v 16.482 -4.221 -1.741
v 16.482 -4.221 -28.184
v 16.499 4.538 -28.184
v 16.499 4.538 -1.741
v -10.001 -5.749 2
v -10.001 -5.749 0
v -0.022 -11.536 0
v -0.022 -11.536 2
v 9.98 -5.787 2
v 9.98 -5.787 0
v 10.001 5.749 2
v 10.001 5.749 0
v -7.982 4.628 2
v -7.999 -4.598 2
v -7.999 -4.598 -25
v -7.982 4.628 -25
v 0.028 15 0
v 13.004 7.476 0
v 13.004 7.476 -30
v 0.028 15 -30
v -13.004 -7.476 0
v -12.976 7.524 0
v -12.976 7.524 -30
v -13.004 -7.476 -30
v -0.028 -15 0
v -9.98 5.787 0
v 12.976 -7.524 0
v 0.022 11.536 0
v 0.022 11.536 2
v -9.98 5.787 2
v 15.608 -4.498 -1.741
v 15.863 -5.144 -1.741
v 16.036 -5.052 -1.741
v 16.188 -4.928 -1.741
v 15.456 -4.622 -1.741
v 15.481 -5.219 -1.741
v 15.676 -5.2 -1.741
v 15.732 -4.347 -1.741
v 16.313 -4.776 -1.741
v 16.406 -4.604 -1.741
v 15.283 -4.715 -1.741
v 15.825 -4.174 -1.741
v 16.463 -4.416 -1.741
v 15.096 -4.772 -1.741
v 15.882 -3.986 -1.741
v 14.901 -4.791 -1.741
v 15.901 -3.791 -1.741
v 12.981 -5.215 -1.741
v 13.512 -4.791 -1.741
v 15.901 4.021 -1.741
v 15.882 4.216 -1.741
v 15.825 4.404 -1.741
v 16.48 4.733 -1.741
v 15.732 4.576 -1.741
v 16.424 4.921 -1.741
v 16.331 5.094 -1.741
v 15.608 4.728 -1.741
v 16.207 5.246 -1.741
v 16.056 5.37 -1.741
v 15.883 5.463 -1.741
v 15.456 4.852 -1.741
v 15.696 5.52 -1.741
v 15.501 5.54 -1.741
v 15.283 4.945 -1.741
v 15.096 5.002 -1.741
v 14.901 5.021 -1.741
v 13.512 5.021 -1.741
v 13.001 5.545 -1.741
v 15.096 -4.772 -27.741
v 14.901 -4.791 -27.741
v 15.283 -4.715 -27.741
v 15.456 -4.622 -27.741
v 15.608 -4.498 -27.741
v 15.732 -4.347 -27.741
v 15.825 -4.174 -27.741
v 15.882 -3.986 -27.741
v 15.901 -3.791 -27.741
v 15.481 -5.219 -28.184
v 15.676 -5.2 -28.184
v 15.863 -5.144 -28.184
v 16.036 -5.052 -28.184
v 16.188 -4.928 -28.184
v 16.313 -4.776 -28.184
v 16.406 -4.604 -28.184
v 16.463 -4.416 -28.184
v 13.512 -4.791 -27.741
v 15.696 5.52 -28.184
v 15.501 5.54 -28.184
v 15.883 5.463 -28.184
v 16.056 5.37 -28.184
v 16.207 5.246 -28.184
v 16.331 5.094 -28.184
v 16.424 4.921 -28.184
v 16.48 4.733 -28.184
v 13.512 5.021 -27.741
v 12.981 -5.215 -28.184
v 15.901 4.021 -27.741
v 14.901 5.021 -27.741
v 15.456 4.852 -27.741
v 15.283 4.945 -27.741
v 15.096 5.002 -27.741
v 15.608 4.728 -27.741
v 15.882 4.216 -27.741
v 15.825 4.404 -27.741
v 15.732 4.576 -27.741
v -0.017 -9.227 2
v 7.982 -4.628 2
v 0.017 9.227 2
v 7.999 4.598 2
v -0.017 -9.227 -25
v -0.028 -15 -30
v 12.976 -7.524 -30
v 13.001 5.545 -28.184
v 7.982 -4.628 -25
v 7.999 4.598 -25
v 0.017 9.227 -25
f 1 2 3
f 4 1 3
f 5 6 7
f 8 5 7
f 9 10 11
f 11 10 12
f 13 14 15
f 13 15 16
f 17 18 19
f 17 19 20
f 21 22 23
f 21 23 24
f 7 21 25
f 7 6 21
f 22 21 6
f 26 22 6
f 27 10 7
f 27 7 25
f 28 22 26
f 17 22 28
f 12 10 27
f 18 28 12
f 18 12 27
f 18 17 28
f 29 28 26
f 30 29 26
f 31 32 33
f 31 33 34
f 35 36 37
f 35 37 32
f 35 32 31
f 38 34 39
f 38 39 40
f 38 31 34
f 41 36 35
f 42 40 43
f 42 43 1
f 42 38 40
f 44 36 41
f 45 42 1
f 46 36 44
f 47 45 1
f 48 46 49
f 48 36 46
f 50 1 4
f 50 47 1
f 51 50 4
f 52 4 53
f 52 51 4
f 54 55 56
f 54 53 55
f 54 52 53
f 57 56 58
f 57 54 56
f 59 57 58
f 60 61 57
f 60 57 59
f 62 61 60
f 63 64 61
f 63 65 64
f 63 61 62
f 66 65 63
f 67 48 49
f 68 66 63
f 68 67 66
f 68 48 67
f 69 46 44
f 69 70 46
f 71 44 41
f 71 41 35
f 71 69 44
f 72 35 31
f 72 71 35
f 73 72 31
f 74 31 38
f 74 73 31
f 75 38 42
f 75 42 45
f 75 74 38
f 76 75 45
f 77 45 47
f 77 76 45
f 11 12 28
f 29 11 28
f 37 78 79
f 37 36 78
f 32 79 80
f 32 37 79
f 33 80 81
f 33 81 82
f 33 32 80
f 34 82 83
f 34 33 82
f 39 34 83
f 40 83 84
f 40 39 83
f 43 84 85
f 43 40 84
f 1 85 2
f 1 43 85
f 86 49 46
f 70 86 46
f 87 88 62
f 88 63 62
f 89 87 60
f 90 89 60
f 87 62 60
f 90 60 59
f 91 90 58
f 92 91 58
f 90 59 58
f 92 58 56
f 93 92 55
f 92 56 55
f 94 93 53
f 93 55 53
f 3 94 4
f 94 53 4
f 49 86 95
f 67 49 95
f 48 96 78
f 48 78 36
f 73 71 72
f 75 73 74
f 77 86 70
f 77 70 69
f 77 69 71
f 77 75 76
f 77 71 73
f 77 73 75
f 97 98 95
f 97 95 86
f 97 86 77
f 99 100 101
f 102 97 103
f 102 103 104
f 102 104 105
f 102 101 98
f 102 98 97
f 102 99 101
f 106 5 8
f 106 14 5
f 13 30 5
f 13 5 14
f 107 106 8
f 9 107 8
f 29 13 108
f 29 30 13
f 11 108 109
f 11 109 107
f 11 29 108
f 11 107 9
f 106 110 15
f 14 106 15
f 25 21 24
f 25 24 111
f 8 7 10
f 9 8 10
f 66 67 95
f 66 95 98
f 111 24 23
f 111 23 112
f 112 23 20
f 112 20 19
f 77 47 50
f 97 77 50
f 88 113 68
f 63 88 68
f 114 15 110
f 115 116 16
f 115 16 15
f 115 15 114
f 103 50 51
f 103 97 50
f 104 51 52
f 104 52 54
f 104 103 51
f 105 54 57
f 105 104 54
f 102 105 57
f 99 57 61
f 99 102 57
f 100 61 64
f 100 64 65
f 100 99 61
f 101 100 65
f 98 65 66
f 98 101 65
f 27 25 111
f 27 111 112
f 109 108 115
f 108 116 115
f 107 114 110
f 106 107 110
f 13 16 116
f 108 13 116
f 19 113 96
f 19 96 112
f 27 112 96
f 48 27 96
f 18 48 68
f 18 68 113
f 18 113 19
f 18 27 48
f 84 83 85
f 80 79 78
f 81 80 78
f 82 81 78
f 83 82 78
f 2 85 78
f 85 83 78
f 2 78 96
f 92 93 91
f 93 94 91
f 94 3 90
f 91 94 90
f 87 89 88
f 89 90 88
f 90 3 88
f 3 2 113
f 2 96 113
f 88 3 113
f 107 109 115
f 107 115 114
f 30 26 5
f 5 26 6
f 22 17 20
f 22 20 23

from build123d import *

# Parameters (mm, degrees)
F1_DEPTH = 30
F3_DEPTH = 25
F5_DEPTH = 2
F6_W     = 10.7590798289
F6_H     = 26.4430916868
F7_DEPTH = 3.5
F8_W     = 2.3892438039
F8_H     = 9.8118302412
F9_DEPTH = 26
F10_R    = 1


with BuildPart() as f1:
    # F0 (on Top) → F1 (new body)
    with BuildSketch(Plane.XY):
        Polygon((13.0044895149, 7.4755634337), (0.0282169163, 15), (-12.9762725986, 7.5244365663), (-13.0044895149, -7.4755634337), (-0.0282169163, -15), (12.9762725986, -7.5244365663), align=None)
    extrude(amount=-F1_DEPTH)

    # F2 (on face) → F3 (cut)
    with BuildSketch(Plane.XY):
        Polygon((7.9817117837, -4.6282847058), (7.999068023, 4.5982228174), (0.0173562394, 9.2265075233), (-7.9817117837, 4.6282847058), (-7.999068023, -4.5982228174), (-0.0173562394, -9.2265075233), align=None)
    extrude(amount=-F3_DEPTH, mode=Mode.SUBTRACT)

    # F4 (on face) → F5 (join)
    with BuildSketch(Plane.XY):
        Polygon((-9.9795361097, 5.78674545), (-10.0012366198, -5.7491590639), (-0.0217005101, -11.535904514), (9.9795361097, -5.78674545), (10.0012366198, 5.7491590639), (0.0217005101, 11.535904514), align=None)
        Polygon((0.0173562394, 9.2265075233), (7.999068023, 4.5982228174), (7.9817117837, -4.6282847058), (-0.0173562394, -9.2265075233), (-7.999068023, -4.5982228174), (-7.9817117837, 4.6282847058), align=None, mode=Mode.SUBTRACT)
    extrude(amount=F5_DEPTH)

    # F6 (on face) → F7 (join)
    with BuildSketch(Plane(origin=(12.9903810568, -0.0244365663, 0), x_dir=(0.0018811244, 0.9999982307, 0), z_dir=(0.9999982307, -0.0018811244, 0))):
        with Locations((0.1894203015, -14.9621136952)):
            Rectangle(F6_W, F6_H)
    extrude(amount=F7_DEPTH)

    # F8 (on face) → F9 (cut)
    with BuildSketch(Plane.XY.offset(-1.7405678518)):
        with Locations((14.7061855532, 0.1149831805)):
            Rectangle(F8_W, F8_H)
    extrude(amount=-F9_DEPTH, mode=Mode.SUBTRACT)

    # F10
    f10_edges = [f1.edges().sort_by_distance(p)[0] for p in [
        (16.480612, -5.221131, -14.962114),
        (16.500851, 5.53793, -14.962114),
        (15.900807, 5.020898, -14.740568),
        (15.900807, -4.790932, -14.740568),
    ]]
    fillet(f10_edges, radius=F10_R)


solid = f1.part
